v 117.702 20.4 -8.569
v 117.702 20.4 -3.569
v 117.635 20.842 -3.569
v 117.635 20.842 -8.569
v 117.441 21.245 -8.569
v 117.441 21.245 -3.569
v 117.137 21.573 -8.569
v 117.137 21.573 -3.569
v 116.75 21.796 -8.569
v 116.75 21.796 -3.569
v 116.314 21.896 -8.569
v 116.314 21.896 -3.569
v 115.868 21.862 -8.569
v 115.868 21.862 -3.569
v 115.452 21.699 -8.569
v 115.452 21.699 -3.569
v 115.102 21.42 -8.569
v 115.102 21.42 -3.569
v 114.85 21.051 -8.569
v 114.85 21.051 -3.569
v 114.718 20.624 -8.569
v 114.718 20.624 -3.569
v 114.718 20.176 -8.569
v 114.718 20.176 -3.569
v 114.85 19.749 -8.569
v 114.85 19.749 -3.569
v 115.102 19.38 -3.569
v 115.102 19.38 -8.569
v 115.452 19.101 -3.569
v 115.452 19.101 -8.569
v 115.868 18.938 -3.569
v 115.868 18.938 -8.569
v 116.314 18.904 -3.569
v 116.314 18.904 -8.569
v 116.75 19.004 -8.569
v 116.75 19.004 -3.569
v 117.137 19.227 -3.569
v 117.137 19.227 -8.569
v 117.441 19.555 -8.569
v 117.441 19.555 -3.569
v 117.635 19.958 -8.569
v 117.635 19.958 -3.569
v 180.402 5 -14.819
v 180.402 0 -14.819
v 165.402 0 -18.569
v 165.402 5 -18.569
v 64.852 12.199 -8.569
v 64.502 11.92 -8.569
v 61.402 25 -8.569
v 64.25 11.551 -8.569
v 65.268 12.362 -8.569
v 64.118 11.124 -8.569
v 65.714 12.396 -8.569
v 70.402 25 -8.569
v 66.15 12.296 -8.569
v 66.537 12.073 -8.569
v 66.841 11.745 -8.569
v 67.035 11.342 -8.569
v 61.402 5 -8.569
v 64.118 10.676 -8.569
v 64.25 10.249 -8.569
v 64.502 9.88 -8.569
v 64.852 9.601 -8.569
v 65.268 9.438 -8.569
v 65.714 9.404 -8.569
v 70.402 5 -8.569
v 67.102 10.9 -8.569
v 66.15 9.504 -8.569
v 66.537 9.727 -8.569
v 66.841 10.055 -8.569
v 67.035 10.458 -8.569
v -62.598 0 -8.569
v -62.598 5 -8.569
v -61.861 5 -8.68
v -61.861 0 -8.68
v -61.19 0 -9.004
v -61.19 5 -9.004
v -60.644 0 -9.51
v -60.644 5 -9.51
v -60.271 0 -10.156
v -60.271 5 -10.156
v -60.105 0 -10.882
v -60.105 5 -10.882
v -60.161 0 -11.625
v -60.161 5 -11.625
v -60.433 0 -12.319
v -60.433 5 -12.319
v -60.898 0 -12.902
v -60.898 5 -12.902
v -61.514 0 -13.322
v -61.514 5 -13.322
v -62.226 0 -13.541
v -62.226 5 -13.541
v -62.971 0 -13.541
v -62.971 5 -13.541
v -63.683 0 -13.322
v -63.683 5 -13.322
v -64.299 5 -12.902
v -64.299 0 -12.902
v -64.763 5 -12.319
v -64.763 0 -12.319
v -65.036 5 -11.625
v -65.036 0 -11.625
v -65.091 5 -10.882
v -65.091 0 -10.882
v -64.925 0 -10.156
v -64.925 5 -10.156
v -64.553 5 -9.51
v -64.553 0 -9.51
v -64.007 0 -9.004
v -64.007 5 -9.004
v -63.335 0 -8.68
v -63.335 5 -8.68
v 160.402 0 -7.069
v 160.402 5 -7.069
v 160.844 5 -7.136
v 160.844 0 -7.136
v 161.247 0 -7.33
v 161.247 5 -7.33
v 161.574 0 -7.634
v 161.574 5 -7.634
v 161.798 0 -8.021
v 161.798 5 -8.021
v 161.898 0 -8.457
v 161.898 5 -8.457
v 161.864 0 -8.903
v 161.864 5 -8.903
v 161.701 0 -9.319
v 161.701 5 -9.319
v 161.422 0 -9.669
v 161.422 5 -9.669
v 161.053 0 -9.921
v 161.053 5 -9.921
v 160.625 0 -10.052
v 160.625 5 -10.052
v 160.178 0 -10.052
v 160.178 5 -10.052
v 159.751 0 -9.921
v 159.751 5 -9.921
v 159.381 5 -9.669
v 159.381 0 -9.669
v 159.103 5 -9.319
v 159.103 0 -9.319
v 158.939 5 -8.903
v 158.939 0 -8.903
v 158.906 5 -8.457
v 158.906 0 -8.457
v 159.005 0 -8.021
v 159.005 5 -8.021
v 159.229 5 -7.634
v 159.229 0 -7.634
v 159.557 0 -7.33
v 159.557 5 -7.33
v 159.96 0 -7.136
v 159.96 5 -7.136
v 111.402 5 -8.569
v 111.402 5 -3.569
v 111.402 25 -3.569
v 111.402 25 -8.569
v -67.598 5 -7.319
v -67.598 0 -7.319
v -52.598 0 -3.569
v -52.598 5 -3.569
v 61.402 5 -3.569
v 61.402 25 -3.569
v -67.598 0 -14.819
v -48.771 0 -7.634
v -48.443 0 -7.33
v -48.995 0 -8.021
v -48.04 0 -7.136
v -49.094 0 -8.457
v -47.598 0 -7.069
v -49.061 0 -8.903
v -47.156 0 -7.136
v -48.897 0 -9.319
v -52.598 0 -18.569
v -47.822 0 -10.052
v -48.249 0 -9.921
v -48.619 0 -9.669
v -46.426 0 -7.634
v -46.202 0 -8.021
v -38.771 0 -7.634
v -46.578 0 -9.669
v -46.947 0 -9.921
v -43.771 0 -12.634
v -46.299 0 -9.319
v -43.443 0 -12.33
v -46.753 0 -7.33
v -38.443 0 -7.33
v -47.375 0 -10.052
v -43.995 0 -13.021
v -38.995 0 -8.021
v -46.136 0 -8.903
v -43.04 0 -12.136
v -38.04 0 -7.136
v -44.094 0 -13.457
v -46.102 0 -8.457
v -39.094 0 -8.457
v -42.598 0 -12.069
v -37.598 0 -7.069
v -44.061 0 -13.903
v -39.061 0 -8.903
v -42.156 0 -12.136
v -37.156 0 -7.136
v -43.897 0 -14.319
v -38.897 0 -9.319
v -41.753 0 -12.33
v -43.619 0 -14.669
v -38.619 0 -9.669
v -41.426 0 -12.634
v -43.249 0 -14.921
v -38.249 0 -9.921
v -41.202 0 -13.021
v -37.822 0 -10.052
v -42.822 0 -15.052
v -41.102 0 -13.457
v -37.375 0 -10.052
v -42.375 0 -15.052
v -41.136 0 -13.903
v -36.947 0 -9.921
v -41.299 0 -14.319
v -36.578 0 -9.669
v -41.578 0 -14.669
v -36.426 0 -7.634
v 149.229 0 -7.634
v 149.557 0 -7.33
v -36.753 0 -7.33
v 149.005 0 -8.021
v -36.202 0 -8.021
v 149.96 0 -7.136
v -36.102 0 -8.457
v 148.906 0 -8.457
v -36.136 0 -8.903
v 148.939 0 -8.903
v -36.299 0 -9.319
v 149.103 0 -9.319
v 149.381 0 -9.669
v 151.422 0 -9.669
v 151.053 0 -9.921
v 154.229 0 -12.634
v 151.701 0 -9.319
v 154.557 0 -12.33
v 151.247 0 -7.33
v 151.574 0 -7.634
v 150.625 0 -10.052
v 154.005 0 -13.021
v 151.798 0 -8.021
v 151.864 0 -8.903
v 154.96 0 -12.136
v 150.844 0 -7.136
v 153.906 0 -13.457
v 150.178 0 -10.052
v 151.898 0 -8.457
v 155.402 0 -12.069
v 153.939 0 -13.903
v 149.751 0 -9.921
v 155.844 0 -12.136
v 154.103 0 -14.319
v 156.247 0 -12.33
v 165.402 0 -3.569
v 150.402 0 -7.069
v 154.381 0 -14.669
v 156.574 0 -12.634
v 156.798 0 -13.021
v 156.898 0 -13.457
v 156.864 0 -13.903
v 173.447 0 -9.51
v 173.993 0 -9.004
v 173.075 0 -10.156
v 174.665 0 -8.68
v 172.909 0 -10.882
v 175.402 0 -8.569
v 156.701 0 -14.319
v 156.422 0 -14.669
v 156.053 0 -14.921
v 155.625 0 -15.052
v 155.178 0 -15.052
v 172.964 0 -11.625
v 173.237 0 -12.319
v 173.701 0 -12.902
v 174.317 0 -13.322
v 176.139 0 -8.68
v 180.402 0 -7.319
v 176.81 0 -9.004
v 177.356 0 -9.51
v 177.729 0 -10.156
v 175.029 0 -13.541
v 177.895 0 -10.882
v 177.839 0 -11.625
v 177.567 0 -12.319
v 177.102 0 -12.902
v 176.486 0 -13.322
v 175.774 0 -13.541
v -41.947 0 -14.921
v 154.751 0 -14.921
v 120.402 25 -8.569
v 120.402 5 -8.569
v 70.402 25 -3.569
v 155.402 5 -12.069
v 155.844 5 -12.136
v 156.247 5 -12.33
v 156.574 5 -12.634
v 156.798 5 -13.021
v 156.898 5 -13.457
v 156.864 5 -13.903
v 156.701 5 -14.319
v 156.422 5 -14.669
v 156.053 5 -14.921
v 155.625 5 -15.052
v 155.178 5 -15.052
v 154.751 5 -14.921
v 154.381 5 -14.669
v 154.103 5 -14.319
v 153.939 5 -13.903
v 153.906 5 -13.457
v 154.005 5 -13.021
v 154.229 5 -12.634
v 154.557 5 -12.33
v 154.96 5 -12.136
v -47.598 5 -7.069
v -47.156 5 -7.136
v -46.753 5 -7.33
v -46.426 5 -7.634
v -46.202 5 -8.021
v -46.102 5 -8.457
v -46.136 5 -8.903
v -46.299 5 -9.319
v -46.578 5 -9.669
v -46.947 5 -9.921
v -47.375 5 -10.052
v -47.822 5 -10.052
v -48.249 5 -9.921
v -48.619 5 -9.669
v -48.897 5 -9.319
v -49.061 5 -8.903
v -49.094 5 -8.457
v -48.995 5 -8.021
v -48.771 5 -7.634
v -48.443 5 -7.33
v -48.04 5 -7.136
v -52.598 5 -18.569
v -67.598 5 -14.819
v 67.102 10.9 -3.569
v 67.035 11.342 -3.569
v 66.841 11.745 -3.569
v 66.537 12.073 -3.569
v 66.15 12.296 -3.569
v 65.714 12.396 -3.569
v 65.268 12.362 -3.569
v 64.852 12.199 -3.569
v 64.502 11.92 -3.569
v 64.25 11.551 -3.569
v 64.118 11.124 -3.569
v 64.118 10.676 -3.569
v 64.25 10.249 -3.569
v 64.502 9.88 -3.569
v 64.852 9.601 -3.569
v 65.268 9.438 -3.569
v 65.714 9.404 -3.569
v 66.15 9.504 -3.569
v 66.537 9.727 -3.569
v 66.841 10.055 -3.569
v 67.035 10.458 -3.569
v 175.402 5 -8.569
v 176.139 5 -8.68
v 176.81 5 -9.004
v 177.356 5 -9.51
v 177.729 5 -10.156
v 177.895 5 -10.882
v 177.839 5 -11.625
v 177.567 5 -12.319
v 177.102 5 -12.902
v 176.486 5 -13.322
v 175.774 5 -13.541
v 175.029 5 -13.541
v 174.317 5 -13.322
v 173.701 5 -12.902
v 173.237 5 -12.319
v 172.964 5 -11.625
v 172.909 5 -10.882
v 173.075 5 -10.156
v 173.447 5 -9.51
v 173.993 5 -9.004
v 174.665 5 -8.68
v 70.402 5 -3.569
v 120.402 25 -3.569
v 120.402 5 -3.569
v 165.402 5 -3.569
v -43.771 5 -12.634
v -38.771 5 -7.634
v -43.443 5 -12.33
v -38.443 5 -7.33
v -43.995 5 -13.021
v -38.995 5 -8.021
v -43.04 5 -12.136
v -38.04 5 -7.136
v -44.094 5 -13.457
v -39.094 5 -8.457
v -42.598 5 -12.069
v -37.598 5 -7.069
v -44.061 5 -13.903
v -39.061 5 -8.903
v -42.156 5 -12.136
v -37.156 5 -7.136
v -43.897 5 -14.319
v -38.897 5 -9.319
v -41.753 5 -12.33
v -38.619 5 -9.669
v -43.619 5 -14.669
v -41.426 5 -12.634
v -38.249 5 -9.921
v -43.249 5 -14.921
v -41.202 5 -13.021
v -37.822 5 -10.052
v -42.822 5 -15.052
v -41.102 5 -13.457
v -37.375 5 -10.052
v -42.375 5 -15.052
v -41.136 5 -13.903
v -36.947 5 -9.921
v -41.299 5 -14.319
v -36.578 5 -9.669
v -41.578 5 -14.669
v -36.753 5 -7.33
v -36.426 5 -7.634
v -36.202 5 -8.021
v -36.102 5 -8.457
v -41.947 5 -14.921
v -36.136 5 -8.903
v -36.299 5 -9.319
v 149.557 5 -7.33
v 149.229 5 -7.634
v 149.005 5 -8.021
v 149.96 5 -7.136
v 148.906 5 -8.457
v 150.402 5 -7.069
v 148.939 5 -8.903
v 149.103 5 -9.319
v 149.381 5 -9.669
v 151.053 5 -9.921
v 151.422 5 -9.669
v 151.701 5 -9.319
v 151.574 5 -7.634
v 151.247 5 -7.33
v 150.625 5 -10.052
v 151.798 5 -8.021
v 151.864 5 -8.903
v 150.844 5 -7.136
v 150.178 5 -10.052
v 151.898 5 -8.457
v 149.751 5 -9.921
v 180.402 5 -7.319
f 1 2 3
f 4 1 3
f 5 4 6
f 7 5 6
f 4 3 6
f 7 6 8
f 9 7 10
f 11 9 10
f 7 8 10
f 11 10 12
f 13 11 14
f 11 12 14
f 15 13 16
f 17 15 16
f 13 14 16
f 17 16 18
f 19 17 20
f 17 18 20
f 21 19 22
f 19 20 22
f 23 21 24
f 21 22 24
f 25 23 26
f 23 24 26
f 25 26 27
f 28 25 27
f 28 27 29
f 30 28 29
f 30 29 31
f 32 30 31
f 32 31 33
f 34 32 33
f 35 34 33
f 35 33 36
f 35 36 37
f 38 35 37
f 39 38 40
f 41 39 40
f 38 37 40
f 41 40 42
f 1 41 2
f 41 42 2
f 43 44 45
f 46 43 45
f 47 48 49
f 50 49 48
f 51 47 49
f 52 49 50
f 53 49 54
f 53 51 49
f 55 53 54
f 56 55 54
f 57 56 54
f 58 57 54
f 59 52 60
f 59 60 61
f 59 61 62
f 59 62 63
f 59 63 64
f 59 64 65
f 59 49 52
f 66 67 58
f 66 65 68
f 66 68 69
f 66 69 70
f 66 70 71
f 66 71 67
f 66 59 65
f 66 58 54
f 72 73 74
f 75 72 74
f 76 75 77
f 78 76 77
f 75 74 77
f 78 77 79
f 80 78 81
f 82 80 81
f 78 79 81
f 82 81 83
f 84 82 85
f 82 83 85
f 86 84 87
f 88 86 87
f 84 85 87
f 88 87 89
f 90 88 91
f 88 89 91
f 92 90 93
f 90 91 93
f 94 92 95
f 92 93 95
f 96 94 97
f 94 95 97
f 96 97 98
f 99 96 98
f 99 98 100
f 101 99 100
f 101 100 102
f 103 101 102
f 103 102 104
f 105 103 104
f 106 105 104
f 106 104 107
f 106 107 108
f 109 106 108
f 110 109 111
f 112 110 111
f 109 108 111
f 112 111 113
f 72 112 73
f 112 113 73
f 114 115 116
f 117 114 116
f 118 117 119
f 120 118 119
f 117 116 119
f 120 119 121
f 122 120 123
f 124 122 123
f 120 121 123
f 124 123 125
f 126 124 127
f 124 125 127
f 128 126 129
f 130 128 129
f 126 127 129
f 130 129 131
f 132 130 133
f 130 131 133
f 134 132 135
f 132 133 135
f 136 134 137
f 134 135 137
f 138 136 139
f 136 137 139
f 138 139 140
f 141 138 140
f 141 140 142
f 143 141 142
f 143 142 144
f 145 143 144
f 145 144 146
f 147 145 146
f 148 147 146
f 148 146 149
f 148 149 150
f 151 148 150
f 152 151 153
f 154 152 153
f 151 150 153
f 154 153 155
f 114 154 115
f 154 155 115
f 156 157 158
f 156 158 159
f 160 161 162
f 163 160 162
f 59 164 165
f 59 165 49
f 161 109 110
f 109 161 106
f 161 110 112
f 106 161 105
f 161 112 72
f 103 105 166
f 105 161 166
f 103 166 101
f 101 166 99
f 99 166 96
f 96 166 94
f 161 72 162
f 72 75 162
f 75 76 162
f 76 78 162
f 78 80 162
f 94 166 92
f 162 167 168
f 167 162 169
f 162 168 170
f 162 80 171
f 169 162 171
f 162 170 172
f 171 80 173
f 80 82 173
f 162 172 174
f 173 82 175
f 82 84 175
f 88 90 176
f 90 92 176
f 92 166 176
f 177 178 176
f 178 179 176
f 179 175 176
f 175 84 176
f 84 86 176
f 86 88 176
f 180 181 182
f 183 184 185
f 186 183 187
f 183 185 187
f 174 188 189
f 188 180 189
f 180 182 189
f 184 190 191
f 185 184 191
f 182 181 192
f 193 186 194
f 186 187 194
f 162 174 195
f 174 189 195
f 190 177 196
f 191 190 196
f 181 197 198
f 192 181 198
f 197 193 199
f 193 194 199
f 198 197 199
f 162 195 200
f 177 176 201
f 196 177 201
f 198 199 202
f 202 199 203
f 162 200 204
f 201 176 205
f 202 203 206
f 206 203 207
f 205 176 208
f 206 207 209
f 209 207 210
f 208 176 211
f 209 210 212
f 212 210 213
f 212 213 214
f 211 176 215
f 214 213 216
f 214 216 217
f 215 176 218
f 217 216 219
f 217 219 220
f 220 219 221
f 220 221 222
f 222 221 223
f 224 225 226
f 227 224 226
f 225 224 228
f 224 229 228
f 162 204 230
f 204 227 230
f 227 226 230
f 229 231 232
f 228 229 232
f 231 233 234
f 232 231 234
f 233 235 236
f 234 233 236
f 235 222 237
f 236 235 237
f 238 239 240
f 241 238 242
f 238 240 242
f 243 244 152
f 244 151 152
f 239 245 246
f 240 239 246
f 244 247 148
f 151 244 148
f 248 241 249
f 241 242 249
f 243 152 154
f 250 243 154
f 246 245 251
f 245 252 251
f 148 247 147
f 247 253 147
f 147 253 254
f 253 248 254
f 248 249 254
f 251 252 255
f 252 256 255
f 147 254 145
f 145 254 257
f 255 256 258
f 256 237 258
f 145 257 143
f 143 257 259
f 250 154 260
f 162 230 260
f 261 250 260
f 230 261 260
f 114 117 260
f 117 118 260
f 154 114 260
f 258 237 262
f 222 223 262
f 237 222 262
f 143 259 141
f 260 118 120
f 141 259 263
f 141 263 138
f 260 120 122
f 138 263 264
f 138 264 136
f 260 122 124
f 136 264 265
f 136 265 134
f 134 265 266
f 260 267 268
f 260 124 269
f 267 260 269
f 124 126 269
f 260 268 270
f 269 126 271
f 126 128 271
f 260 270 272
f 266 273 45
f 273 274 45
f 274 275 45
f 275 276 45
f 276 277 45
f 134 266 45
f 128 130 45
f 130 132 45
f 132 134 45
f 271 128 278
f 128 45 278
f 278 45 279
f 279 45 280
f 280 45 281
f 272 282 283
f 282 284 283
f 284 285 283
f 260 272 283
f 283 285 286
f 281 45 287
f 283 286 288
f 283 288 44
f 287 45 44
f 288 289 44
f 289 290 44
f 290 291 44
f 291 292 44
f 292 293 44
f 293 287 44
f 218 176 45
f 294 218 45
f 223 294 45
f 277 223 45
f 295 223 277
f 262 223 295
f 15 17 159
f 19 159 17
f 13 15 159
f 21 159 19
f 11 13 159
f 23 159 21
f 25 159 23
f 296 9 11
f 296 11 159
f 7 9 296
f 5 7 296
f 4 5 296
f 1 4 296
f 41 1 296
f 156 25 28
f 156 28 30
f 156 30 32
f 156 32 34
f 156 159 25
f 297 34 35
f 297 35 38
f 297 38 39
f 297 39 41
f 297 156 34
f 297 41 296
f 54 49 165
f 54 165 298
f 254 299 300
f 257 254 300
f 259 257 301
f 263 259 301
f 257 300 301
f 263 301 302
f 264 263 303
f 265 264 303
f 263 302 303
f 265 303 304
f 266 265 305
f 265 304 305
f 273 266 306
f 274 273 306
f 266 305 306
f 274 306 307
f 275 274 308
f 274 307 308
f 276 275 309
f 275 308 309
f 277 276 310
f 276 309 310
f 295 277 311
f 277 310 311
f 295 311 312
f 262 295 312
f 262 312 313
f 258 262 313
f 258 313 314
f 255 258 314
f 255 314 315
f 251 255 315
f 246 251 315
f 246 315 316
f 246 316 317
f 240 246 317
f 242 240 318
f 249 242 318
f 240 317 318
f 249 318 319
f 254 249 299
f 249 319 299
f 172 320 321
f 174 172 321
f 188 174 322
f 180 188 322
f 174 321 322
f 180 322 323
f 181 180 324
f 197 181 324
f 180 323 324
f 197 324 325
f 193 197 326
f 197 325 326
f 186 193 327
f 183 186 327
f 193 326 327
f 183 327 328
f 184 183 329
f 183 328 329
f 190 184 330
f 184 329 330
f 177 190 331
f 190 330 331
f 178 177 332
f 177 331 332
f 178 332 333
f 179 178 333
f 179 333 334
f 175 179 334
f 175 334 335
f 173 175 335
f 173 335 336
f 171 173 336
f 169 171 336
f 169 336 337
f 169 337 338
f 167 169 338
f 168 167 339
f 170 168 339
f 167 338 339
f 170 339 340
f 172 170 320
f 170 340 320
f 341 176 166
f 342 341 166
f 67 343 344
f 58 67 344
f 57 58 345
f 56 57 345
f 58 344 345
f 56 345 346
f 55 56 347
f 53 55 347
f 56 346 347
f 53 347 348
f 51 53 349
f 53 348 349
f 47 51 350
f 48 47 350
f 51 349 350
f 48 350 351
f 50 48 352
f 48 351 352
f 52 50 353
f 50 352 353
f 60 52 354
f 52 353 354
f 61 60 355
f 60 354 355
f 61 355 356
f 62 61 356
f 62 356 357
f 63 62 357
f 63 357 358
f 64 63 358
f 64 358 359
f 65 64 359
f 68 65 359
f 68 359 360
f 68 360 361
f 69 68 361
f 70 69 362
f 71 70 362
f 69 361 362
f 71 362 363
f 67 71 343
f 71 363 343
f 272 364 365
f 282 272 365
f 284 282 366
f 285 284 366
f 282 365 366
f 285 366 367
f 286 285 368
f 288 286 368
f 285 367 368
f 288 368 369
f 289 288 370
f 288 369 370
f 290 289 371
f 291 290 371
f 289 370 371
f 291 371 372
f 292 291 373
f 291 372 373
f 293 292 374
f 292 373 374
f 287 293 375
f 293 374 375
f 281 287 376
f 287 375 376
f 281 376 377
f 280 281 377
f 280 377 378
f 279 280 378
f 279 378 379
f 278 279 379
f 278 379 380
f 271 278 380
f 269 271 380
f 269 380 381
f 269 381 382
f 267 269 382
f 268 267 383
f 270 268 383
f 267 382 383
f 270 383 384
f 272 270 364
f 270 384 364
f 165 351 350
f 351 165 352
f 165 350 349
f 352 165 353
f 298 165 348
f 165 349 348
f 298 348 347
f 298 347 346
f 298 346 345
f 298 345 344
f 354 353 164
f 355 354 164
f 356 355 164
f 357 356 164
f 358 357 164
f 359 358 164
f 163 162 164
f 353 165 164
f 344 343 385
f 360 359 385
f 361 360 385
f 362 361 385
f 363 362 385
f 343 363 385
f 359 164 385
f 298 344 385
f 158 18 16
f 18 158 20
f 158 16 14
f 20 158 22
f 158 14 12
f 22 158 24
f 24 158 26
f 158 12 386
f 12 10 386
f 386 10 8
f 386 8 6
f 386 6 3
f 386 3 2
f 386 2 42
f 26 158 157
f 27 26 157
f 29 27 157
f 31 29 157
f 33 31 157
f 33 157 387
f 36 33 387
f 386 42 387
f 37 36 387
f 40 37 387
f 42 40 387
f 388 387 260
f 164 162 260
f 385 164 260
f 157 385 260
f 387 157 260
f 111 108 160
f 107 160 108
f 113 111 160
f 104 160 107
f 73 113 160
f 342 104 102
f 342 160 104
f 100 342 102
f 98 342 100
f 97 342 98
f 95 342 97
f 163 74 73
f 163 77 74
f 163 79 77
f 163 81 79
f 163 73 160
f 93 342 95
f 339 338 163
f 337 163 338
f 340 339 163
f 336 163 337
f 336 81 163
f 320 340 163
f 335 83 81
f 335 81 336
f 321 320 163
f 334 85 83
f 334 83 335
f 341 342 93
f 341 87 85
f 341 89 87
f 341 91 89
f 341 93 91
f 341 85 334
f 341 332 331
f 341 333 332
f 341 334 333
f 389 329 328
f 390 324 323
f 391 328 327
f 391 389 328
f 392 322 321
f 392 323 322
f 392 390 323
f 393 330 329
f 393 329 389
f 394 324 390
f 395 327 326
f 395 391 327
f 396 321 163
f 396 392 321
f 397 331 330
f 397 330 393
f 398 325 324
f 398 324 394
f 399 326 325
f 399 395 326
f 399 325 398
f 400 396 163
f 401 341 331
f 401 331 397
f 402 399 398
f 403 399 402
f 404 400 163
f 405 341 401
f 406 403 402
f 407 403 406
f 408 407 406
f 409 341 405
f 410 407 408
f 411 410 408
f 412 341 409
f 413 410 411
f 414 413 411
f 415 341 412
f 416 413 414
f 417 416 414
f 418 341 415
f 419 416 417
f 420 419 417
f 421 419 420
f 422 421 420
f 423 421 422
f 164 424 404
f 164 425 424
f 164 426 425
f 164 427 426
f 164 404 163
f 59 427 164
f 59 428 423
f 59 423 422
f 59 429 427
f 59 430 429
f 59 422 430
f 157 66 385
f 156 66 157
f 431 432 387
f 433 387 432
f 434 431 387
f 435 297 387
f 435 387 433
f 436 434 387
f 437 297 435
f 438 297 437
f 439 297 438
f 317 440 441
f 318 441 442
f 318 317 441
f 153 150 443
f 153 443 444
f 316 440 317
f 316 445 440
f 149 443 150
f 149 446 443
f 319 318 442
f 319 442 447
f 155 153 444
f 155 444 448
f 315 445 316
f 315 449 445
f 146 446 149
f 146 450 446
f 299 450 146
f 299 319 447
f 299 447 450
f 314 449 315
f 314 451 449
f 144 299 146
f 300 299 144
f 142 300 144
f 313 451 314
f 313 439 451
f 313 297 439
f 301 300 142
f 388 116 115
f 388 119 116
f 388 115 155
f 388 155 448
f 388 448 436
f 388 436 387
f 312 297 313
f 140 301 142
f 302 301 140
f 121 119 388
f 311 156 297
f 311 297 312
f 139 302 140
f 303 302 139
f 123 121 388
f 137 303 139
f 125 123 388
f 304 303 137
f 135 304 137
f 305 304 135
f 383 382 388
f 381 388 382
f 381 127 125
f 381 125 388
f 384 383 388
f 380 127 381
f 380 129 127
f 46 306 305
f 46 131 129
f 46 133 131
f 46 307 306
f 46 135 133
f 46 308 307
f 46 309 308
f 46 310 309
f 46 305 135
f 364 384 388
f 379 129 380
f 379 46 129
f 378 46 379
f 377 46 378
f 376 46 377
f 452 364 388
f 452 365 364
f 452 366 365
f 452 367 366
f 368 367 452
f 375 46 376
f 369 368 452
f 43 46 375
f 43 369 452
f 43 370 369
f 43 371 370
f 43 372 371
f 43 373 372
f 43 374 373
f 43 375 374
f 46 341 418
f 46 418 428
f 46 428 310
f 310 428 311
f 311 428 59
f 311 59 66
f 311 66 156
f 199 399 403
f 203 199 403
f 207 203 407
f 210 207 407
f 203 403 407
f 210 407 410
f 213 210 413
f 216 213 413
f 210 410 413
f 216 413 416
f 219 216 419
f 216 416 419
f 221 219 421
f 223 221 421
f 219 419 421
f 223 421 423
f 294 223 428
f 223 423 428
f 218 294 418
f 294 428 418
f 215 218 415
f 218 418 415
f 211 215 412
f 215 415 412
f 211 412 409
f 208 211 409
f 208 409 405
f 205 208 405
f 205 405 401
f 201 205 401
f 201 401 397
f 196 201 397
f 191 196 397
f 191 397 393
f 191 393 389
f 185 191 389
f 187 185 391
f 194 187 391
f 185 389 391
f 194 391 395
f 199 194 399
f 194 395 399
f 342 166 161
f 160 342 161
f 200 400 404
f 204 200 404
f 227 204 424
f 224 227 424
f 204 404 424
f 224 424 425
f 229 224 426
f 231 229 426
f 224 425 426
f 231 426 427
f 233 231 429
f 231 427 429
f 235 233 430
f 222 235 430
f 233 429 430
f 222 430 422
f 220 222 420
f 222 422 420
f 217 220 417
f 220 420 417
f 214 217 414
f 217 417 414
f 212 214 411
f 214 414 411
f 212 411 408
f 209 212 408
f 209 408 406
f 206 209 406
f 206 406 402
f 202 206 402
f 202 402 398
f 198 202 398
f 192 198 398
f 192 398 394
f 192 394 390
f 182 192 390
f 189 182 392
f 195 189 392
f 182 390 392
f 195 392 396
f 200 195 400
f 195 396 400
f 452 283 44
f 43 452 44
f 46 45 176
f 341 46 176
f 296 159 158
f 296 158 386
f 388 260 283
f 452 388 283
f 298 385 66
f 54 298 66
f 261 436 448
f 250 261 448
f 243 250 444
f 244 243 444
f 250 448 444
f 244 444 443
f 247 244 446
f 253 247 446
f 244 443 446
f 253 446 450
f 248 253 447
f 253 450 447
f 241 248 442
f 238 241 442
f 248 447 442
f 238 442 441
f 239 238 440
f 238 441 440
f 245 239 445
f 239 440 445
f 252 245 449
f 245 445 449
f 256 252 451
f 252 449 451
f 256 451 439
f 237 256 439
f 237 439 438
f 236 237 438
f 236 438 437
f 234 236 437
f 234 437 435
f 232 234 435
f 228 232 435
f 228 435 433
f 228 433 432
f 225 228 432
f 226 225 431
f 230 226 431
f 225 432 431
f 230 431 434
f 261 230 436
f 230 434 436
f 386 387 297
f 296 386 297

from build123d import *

# Parameters (mm, degrees)
BOSS_EXTRUDE1_DEPTH = 5
SKETCH2_R           = 1.5
SKETCH2_R_2         = 2.5
CUT_EXTRUDE1_DEPTH  = 5
SKETCH4_W           = 9
SKETCH4_H           = 5
BOSS_EXTRUDE2_DEPTH = 20
SKETCH6_R           = 1.5
CUT_EXTRUDE2_DEPTH  = 5


with BuildPart() as part:
    # Sketch1 → Boss-Extrude1 (new body)
    with BuildSketch(Plane(origin=(0, 0, 0), x_dir=(1, 0, 0), z_dir=(0, 1, 0))):
        Polygon((-67.598283163, 7.319100723), (-52.598283163, 3.569100723), (165.401716837, 3.569100723), (180.401716837, 7.319100723), (180.401716837, 14.819100723), (165.401716837, 18.569100723), (-52.598283163, 18.569100723), (-67.598283163, 14.819100723), align=None)
    extrude(amount=BOSS_EXTRUDE1_DEPTH)

    # Sketch2 → Cut-Extrude1 (cut)
    with BuildSketch(Plane(origin=(0, 5, 0), x_dir=(1, 0, 0), z_dir=(0, 1, 0))):
        with Locations(Location((155.401716837, 13.569100723, 0), (0, 0, 270))):
            Circle(SKETCH2_R)
        with Locations(Location((160.401716837, 8.569100723, 0), (0, 0, 270))):
            Circle(SKETCH2_R)
        with Locations(Location((150.401716837, 8.569100723, 0), (0, 0, 270))):
            Circle(SKETCH2_R)
        with Locations(Location((-47.598283163, 8.569100723, 0), (0, 0, 270))):
            Circle(SKETCH2_R)
        with Locations(Location((-37.598283163, 8.569100723, 0), (0, 0, 270))):
            Circle(SKETCH2_R)
        with Locations(Location((-42.598283163, 13.569100723, 0), (0, 0, 270))):
            Circle(SKETCH2_R)
        with Locations(Location((-62.598283163, 11.069100723, 0), (0, 0, 270))):
            Circle(SKETCH2_R_2)
        with Locations(Location((175.401716837, 11.069100723, 0), (0, 0, 270))):
            Circle(SKETCH2_R_2)
    extrude(amount=-CUT_EXTRUDE1_DEPTH, mode=Mode.SUBTRACT)

    # Sketch4 → Boss-Extrude2 (add)
    with BuildSketch(Plane(origin=(-36.696088283, 5, 1.62747237), x_dir=(1, 0, 0), z_dir=(0, 1, 0))):
        with Locations((102.59780512, 7.696573093)):
            Rectangle(SKETCH4_W, SKETCH4_H)
        with Locations((152.59780512, 7.696573093)):
            Rectangle(SKETCH4_W, SKETCH4_H)
    extrude(amount=BOSS_EXTRUDE2_DEPTH)

    # Sketch6 → Cut-Extrude2 (cut)
    with BuildSketch(Plane(origin=(-36.696088283, 0, -3.569100723), x_dir=(1, 0, 0), z_dir=(0, 0, 1))):
        with Locations((102.29780512, 10.9)):
            Circle(SKETCH6_R)
        with Locations((152.89780512, 20.4)):
            Circle(SKETCH6_R)
    extrude(amount=-CUT_EXTRUDE2_DEPTH, mode=Mode.SUBTRACT)


solid = part.part
